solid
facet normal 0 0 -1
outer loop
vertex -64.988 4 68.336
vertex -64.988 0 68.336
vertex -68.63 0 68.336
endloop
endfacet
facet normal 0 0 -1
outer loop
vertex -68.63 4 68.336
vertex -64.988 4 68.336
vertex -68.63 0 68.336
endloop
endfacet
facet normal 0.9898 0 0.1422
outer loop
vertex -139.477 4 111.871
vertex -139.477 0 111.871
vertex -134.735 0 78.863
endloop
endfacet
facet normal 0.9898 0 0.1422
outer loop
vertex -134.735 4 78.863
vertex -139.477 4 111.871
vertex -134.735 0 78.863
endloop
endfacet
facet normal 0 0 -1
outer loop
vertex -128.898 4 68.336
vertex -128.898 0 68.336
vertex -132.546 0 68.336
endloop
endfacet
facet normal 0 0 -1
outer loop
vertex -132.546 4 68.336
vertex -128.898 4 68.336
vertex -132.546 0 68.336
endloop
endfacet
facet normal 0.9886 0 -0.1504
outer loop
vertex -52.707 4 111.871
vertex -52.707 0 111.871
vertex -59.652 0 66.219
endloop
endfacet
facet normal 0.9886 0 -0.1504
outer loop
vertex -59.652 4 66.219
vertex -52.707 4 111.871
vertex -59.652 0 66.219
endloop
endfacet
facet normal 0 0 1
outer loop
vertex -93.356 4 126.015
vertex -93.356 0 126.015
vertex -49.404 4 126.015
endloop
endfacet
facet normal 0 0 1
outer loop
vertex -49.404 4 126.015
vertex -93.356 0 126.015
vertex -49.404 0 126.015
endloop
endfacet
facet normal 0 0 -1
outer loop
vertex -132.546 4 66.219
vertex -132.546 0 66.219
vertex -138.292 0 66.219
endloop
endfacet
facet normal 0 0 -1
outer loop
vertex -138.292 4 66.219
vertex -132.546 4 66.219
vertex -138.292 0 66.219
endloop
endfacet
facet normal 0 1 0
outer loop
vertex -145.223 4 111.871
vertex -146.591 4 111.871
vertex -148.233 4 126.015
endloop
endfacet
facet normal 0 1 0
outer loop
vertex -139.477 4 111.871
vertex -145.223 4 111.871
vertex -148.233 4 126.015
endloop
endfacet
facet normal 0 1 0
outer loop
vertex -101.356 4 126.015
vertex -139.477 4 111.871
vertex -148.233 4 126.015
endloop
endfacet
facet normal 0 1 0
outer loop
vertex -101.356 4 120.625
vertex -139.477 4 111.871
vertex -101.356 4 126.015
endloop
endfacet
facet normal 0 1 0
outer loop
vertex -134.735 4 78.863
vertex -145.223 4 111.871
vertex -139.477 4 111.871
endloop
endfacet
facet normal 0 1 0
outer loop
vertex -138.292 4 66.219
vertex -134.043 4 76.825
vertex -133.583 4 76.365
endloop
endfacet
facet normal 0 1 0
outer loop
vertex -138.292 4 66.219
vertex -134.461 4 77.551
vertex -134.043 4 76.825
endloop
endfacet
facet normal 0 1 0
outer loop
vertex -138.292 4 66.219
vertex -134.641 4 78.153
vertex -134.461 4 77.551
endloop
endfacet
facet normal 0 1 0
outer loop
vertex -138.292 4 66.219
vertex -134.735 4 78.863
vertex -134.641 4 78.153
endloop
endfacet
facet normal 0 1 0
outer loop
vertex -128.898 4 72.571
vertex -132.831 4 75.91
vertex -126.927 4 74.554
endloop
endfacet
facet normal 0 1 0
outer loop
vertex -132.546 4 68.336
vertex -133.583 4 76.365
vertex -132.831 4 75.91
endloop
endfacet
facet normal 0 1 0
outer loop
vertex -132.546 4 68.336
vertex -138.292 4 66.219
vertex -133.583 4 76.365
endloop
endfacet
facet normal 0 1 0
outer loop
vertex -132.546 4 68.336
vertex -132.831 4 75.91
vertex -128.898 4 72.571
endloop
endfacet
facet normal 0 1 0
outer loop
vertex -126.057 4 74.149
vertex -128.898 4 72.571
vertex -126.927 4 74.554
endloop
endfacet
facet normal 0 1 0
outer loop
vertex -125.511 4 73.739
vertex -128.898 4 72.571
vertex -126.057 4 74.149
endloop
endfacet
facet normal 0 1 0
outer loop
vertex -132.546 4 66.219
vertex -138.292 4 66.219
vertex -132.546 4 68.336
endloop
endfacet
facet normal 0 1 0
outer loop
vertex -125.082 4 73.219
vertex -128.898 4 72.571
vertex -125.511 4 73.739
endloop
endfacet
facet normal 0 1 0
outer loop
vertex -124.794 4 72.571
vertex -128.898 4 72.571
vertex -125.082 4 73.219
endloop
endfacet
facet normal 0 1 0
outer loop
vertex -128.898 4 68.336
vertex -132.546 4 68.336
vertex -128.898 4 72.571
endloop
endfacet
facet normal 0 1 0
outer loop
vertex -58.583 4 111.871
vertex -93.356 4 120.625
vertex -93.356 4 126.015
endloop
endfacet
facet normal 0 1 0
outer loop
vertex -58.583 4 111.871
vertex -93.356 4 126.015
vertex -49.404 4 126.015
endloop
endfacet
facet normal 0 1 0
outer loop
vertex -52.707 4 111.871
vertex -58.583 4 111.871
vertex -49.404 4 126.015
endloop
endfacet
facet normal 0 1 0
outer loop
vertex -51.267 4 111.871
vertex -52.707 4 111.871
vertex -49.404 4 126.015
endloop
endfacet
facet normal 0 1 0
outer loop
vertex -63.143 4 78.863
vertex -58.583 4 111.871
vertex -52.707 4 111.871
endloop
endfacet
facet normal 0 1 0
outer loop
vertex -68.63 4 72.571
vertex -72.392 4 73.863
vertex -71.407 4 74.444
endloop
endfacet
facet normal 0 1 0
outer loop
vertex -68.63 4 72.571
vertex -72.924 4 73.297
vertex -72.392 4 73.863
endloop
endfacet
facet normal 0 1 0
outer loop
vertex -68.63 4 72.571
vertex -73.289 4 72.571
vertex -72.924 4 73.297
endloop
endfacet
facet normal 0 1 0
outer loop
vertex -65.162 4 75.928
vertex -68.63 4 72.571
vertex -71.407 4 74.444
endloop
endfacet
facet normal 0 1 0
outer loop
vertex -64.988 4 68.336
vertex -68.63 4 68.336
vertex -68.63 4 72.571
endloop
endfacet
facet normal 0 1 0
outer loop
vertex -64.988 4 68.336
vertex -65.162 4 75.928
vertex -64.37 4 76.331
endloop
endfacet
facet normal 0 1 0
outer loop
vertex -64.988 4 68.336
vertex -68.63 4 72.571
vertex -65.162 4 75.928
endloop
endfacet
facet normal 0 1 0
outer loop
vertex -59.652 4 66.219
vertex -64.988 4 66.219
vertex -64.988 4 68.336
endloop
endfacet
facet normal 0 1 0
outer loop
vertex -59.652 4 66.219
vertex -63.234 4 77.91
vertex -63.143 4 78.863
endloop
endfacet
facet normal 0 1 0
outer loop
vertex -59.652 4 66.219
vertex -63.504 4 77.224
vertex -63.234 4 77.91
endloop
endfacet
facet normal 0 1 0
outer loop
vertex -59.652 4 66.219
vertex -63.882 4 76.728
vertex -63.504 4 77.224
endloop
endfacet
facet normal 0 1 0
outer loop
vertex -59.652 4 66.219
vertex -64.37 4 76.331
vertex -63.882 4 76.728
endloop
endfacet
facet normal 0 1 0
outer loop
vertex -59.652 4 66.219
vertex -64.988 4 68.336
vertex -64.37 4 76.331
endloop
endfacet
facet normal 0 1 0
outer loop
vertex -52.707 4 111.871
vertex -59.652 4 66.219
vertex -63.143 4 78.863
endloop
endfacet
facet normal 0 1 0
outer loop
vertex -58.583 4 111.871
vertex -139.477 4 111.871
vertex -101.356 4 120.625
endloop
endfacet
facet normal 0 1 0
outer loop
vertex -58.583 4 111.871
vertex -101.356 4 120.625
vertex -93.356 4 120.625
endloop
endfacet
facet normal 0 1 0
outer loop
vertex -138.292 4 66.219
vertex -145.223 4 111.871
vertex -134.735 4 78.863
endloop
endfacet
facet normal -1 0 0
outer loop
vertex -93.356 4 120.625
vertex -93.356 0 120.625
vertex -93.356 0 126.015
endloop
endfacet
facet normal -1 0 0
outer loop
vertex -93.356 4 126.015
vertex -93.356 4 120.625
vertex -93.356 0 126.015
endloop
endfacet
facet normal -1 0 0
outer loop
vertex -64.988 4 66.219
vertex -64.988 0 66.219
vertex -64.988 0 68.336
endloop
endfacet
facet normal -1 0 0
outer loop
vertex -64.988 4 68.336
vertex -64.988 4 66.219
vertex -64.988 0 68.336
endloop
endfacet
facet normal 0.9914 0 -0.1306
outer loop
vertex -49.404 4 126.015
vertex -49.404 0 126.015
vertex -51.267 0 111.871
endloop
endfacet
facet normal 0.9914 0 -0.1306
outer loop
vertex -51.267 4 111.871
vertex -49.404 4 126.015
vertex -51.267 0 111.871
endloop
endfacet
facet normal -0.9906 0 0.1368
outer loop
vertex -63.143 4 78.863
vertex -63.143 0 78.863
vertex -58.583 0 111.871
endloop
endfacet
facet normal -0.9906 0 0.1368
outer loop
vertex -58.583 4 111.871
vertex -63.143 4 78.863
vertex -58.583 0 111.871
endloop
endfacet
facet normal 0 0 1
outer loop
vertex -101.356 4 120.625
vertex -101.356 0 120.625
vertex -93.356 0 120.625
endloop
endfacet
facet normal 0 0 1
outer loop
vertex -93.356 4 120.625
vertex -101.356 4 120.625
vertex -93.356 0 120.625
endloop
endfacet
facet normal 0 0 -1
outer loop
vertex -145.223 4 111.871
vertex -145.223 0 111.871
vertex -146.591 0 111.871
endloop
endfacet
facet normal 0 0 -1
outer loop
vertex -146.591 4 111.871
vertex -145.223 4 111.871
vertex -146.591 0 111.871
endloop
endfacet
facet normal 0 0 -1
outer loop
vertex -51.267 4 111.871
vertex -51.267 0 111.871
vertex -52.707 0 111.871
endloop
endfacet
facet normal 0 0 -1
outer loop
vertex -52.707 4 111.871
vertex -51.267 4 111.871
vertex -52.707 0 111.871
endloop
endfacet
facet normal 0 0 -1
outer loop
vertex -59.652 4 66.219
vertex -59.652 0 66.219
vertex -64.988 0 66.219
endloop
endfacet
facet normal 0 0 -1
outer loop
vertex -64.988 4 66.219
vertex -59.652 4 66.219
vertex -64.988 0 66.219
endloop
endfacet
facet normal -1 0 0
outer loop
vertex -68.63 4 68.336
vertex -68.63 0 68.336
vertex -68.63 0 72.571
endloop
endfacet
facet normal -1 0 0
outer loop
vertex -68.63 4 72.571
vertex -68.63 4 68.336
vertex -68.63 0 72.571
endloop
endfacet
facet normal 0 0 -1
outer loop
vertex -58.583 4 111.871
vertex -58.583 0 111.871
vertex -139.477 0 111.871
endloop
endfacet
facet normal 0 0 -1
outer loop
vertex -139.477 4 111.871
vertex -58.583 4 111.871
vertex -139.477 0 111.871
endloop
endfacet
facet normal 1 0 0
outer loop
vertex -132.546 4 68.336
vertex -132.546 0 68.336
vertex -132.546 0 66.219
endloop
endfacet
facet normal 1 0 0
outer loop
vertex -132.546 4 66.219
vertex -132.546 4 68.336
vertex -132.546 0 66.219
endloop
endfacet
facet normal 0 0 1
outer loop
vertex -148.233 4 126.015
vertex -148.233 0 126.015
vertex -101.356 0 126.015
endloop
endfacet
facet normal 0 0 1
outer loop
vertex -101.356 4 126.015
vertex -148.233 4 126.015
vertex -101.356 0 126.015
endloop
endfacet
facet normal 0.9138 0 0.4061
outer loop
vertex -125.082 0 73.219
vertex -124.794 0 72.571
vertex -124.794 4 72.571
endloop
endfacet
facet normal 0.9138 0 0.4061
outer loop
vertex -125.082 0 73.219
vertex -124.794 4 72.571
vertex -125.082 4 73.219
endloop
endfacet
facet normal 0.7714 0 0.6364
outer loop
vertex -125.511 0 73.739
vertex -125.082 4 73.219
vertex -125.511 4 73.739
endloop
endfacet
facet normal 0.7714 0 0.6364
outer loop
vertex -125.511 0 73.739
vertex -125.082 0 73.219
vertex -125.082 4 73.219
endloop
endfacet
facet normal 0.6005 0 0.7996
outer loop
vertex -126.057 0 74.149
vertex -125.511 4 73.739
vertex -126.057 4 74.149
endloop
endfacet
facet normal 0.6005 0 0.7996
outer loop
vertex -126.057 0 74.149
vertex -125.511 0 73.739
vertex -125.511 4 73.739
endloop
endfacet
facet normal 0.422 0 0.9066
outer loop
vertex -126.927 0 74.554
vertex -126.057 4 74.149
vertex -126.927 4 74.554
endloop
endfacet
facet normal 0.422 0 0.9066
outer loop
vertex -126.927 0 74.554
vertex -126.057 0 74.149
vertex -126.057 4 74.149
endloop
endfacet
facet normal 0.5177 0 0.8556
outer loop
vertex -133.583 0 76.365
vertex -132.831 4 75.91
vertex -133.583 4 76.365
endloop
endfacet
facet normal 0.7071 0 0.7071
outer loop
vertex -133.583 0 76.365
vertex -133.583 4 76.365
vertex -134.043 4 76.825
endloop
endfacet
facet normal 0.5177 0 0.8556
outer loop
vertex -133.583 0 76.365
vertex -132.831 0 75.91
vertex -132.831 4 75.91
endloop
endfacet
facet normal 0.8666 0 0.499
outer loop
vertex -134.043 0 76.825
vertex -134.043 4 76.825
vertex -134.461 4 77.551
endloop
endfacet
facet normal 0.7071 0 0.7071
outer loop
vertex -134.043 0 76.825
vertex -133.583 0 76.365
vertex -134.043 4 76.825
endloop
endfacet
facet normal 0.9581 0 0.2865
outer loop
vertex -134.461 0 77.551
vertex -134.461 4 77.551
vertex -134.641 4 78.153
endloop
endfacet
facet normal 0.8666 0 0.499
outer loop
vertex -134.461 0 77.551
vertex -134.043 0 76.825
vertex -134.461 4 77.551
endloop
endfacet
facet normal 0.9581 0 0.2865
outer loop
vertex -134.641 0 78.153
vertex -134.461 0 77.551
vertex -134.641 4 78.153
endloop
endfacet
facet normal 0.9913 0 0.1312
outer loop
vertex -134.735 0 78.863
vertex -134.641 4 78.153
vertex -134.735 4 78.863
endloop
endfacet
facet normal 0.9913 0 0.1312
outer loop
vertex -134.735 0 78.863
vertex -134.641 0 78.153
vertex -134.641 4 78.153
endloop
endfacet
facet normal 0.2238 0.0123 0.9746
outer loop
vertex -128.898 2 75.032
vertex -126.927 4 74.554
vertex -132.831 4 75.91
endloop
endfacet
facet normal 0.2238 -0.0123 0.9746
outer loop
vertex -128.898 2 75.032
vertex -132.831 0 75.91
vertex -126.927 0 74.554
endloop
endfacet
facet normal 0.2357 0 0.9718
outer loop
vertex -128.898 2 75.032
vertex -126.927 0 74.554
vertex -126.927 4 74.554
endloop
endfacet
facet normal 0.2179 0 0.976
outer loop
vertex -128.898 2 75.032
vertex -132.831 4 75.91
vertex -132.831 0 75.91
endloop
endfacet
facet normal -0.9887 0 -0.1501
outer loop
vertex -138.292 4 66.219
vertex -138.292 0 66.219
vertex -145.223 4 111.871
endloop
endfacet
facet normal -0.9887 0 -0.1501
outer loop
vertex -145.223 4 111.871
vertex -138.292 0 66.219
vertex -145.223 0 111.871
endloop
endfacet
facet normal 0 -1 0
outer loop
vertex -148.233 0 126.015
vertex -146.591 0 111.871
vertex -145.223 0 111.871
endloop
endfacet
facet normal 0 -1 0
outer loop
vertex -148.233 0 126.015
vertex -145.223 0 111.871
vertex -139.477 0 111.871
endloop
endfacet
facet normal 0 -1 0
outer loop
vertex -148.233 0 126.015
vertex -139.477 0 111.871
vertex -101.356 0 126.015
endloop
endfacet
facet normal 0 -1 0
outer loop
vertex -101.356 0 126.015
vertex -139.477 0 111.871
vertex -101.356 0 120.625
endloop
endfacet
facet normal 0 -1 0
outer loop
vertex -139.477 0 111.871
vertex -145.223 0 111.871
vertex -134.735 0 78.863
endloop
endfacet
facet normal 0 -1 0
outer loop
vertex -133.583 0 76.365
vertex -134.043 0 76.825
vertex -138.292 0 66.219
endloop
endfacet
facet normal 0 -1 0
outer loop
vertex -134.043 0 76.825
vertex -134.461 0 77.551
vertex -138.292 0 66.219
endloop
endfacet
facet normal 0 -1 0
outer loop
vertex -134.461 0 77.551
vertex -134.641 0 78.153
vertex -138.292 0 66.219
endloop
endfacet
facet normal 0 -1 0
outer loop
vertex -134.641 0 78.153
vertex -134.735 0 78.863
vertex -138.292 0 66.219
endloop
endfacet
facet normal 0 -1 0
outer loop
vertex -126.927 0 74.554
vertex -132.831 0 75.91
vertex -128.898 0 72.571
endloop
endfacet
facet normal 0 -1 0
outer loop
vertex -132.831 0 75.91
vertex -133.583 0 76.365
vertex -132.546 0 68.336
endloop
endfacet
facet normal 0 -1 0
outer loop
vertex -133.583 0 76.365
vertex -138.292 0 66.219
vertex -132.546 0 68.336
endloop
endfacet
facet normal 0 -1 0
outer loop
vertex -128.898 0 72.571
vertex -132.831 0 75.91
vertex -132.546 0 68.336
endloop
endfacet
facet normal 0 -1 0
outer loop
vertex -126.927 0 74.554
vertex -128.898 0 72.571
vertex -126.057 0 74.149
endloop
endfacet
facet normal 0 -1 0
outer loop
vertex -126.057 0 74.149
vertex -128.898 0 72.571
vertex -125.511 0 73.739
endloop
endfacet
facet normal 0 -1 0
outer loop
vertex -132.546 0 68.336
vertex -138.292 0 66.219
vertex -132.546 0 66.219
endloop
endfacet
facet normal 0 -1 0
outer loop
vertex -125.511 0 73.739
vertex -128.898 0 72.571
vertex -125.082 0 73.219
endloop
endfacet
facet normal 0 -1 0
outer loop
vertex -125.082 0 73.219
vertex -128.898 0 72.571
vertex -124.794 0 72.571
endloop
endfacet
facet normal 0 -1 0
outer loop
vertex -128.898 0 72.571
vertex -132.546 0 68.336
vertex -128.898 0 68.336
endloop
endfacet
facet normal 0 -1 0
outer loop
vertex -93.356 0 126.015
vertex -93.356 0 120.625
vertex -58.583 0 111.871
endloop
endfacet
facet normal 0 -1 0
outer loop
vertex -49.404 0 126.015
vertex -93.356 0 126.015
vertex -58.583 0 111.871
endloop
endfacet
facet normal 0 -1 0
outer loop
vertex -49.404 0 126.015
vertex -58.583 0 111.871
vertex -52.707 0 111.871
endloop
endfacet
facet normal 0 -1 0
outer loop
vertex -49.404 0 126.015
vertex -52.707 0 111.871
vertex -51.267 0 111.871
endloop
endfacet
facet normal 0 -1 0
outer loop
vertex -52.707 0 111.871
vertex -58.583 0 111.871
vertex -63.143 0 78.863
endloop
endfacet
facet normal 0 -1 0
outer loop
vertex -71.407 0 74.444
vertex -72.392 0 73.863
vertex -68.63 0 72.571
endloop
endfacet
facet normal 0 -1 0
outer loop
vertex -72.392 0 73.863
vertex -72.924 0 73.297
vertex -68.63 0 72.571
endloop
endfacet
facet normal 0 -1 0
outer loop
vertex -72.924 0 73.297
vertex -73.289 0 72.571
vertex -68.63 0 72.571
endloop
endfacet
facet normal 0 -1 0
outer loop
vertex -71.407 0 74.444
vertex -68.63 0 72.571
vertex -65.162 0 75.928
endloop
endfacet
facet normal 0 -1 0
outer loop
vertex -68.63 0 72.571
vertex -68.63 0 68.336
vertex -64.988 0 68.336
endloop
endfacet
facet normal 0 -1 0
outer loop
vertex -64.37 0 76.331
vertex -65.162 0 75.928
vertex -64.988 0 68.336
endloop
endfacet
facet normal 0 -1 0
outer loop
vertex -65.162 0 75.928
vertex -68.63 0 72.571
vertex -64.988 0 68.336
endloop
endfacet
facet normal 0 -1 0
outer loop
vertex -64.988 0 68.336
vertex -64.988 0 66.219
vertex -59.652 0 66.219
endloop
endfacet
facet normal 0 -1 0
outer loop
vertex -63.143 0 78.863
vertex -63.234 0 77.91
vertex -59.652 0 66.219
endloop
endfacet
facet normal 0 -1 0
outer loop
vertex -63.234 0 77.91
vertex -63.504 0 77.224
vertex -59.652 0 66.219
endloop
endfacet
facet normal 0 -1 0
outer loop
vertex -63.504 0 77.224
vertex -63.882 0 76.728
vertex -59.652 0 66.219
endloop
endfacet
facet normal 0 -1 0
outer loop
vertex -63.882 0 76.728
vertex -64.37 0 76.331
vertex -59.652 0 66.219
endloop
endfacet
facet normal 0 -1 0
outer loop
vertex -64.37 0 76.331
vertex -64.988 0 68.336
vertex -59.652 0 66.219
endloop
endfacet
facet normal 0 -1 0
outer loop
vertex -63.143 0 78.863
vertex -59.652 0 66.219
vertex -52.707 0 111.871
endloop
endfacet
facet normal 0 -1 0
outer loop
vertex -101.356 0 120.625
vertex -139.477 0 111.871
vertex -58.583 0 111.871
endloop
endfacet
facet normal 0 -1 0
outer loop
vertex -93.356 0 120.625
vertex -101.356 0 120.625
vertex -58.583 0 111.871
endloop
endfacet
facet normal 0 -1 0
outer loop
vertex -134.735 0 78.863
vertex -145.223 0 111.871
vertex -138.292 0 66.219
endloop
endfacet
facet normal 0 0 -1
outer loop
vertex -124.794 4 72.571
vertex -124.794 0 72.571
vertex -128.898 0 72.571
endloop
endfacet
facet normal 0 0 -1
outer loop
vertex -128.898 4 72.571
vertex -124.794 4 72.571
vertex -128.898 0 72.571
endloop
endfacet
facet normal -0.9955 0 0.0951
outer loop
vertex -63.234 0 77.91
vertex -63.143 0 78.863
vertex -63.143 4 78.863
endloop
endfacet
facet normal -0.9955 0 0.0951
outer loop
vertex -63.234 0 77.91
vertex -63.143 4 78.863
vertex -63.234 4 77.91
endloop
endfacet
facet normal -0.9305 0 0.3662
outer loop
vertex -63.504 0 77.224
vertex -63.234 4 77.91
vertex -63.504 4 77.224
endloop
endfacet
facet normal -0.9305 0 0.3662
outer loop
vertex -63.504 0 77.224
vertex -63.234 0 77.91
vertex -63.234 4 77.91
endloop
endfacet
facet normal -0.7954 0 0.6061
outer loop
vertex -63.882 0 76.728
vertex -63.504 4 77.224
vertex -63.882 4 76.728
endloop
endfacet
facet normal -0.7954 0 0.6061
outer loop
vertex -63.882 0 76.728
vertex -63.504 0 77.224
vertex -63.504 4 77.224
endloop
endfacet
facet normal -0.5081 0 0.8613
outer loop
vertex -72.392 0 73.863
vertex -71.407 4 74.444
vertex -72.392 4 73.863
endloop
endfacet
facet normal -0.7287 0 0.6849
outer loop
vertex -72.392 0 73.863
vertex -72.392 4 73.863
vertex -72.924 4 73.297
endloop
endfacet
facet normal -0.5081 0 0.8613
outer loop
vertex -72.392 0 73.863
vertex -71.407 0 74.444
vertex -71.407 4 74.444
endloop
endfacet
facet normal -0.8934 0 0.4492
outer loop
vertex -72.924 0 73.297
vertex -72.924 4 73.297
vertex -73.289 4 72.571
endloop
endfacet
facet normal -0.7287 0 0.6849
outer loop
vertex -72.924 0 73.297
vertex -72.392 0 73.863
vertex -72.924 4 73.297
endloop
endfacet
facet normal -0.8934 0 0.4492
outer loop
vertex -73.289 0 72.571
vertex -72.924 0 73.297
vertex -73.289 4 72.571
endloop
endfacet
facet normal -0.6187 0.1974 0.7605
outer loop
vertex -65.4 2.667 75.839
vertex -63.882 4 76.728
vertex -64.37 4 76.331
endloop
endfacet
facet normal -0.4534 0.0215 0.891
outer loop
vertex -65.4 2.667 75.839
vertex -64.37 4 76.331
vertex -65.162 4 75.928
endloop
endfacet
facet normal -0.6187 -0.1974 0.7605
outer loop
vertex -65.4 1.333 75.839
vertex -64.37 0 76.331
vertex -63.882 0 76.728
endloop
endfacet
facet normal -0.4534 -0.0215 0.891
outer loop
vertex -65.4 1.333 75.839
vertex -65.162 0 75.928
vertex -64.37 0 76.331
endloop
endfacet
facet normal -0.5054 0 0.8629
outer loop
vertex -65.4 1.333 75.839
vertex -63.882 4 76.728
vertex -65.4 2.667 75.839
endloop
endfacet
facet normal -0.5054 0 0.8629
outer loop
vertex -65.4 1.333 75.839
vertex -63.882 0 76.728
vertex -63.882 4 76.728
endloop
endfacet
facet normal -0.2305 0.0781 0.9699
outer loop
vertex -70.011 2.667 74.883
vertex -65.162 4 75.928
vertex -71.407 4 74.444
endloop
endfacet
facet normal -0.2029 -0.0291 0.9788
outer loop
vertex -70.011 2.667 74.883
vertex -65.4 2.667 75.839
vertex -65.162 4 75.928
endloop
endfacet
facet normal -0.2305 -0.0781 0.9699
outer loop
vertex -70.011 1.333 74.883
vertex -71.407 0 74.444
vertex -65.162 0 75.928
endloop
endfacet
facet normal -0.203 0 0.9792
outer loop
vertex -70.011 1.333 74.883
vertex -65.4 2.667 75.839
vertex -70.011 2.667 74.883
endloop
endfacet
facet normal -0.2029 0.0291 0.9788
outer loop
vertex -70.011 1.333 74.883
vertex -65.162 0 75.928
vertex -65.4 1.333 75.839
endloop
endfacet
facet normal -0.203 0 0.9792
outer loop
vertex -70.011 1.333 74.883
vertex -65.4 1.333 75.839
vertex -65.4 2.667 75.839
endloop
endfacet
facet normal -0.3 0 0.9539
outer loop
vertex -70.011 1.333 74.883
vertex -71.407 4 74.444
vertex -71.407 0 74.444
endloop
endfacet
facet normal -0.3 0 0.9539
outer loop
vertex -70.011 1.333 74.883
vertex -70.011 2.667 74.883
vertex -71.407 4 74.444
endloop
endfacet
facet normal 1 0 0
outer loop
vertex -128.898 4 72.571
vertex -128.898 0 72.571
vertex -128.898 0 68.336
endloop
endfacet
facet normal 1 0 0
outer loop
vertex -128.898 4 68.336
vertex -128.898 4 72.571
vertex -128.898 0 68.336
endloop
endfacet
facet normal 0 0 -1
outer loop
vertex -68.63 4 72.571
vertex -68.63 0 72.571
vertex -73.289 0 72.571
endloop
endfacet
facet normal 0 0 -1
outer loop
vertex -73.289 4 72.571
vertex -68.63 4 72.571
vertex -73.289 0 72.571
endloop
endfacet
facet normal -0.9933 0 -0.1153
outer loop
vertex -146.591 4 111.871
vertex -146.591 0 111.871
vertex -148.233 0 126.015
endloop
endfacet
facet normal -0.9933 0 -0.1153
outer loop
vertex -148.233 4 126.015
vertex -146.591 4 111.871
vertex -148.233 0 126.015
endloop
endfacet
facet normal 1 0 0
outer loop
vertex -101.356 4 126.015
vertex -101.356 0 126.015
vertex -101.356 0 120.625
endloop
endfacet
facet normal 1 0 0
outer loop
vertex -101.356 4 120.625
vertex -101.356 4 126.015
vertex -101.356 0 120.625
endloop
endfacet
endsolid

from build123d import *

# Parameters (mm, degrees)
EXTRUDE_1_DEPTH = 4


with BuildPart() as part:
    # 草图1 → 凸台-拉伸1 (new body)
    with BuildSketch(Plane(origin=(0, 0, 0), x_dir=(1, 0, 0), z_dir=(0, 1, 0))):
        with BuildLine():
            Line((-49.404028848, -126.014907086), (-51.26736259, -111.870510049))
            Line((-51.26736259, -111.870510049), (-52.70721139, -111.870510049))
            Line((-52.70721139, -111.870510049), (-59.652364426, -66.218833388))
            Line((-59.652364426, -66.218833388), (-64.988274685, -66.218833388))
            Line((-64.988274685, -66.218833388), (-64.988274685, -68.336258094))
            Line((-64.988274685, -68.336258094), (-68.630245179, -68.336258094))
            Line((-68.630245179, -68.336258094), (-68.630245179, -72.571107506))
            Line((-68.630245179, -72.571107506), (-73.288579532, -72.571107506))
            add(Edge.make_bspline(
                [(-63.143369767, -78.862797811), (-62.992435868, -73.662892561), (-71.907525745, -76.703218171), (-73.288579532, -72.571107506)],
                knots=[0, 0, 0, 0, 1, 1, 1, 1], degree=3))
            Line((-63.143369767, -78.862797811), (-58.583386552, -111.870510049))
            Line((-58.583386552, -111.870510049), (-139.477488779, -111.870510049))
            Line((-139.477488779, -111.870510049), (-134.735106236, -78.862797811))
            add(Edge.make_bspline(
                [(-124.794342828, -72.571107506), (-125.277958037, -74.232765948), (-129.876755781, -75.477760941), (-134.529259996, -75.567175036), (-134.735106236, -78.862797811)],
                knots=[0, 0, 0, 0, 0.392720746, 1, 1, 1, 1], degree=3))
            Line((-124.794342828, -72.571107506), (-128.898327721, -72.571107506))
            Line((-128.898327721, -72.571107506), (-128.898327721, -68.336258094))
            Line((-128.898327721, -68.336258094), (-132.546314293, -68.336258094))
            Line((-132.546314293, -68.336258094), (-132.546314293, -66.218833388))
            Line((-132.546314293, -66.218833388), (-138.291893143, -66.218833388))
            Line((-138.291893143, -66.218833388), (-145.223067629, -111.870510049))
            Line((-145.223067629, -111.870510049), (-146.591062594, -111.870510049))
            Line((-146.591062594, -111.870510049), (-148.232656551, -126.014907086))
            Line((-148.232656551, -126.014907086), (-101.356029105, -126.014907086))
            Line((-101.356029105, -126.014907086), (-101.356029105, -120.624924421))
            Line((-101.356029105, -120.624924421), (-93.356029105, -120.624924421))
            Line((-93.356029105, -120.624924421), (-93.356029105, -126.014907086))
            Line((-93.356029105, -126.014907086), (-49.404028848, -126.014907086))
        make_face()
    extrude(amount=EXTRUDE_1_DEPTH)


solid = part.part
